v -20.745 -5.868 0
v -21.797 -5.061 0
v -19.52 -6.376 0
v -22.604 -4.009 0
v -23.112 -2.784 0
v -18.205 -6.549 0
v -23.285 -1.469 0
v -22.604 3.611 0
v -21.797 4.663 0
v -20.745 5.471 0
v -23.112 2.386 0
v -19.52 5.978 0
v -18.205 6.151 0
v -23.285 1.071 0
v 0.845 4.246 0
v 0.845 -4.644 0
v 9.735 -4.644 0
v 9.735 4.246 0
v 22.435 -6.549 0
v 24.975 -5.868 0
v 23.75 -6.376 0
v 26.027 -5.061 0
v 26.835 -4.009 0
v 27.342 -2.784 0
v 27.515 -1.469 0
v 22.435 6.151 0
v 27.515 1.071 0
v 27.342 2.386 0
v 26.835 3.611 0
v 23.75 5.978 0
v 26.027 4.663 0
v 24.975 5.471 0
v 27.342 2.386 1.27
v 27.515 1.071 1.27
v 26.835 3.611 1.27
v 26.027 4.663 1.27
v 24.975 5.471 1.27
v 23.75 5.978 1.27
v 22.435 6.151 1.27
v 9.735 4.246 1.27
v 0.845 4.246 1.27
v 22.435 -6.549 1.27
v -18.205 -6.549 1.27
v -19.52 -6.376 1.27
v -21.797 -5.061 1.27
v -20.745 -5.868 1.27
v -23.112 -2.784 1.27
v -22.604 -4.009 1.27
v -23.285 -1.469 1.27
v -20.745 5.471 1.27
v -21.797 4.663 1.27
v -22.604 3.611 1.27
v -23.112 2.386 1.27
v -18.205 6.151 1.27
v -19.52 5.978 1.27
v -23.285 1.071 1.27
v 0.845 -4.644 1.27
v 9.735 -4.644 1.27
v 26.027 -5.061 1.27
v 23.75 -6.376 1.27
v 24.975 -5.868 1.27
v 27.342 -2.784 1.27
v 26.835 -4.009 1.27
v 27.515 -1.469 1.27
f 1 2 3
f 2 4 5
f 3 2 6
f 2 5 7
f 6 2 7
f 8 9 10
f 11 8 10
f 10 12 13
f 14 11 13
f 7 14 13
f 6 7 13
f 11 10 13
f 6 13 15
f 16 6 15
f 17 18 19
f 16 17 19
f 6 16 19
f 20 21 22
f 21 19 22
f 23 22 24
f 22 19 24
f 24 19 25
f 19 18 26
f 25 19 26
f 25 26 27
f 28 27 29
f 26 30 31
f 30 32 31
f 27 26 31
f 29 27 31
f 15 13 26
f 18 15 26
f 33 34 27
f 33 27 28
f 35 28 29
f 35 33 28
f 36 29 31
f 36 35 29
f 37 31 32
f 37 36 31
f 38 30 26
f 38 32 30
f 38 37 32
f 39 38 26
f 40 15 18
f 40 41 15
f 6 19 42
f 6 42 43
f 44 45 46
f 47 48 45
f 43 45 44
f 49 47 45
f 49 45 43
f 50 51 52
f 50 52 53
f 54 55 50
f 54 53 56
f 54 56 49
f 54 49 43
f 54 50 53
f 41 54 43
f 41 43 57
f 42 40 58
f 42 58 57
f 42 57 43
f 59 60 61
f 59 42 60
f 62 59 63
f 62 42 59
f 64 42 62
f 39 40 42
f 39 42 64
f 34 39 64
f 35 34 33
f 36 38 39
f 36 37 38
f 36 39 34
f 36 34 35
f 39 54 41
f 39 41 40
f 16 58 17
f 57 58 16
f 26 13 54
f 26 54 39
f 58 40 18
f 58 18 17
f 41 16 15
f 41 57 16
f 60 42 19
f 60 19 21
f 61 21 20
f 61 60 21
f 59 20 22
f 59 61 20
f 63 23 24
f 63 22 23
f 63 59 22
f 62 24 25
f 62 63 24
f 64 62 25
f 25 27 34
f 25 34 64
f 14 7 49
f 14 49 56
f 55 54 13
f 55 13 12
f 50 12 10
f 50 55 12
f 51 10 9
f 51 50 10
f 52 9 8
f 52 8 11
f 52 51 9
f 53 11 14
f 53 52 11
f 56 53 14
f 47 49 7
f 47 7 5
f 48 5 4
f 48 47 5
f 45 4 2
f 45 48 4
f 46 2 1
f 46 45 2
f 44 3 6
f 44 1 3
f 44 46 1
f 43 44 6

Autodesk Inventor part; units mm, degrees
ref_plane "YZ Plane" through (0, 0, 0) normal (1, 0, 0) x (0, 1, 0)
ref_plane "XZ Plane" through (0, 0, 0) normal (0, 1, 0) x (-1, 0, 0)
ref_plane "XY Plane" through (0, 0, 0) normal (0, 0, 1) x (1, 0, 0)
sketch "Sketch1" plane through (0, 0, 0) normal (0, 0, 1) x (1, 0, 0)
  line L0 (-23.2848, 6.1511) -> (27.5152, 6.1511)
  line L1 (27.5152, 6.1511) -> (27.5152, -6.5489)
  line L2 (27.5152, -6.5489) -> (-23.2848, -6.5489)
  line L3 (-23.2848, -6.5489) -> (-23.2848, 6.1511)
  dimension "d0" = 50.8
  dimension "d1" = 12.7
extrude "Extrusion1" add sketch "Sketch1" along normal blind 1.27
fillet "Fillet1" radius 5.08 4 edges at (-23.2848, 6.1511, 0.635) (27.5152, 6.1511, 0.635) (27.5152, -6.5489, 0.635) (-23.2848, -6.5489, 0.635)
sketch "Sketch2" plane through (0, 0, 1.27) normal (0, 0, 1) x (1, 0, 0)
  line L0 (0.8452, 4.2461) -> (9.7352, 4.2461)
  line L1 (9.7352, 4.2461) -> (9.7352, -4.6439)
  line L2 (9.7352, -4.6439) -> (0.8452, -4.6439)
  line L3 (0.8452, -4.6439) -> (0.8452, 4.2461)
  point P0 (22.4352, -6.5489)
  point P1 (27.5152, -1.4689)
  dimension "d5" = 8.89
  dimension "d6" = 17.78
  dimension "d7" = 1.905
  dimension "d8" = 8.89
extrude "Extrusion2" cut sketch "Sketch2" against normal through all
properties part number "tongue"
